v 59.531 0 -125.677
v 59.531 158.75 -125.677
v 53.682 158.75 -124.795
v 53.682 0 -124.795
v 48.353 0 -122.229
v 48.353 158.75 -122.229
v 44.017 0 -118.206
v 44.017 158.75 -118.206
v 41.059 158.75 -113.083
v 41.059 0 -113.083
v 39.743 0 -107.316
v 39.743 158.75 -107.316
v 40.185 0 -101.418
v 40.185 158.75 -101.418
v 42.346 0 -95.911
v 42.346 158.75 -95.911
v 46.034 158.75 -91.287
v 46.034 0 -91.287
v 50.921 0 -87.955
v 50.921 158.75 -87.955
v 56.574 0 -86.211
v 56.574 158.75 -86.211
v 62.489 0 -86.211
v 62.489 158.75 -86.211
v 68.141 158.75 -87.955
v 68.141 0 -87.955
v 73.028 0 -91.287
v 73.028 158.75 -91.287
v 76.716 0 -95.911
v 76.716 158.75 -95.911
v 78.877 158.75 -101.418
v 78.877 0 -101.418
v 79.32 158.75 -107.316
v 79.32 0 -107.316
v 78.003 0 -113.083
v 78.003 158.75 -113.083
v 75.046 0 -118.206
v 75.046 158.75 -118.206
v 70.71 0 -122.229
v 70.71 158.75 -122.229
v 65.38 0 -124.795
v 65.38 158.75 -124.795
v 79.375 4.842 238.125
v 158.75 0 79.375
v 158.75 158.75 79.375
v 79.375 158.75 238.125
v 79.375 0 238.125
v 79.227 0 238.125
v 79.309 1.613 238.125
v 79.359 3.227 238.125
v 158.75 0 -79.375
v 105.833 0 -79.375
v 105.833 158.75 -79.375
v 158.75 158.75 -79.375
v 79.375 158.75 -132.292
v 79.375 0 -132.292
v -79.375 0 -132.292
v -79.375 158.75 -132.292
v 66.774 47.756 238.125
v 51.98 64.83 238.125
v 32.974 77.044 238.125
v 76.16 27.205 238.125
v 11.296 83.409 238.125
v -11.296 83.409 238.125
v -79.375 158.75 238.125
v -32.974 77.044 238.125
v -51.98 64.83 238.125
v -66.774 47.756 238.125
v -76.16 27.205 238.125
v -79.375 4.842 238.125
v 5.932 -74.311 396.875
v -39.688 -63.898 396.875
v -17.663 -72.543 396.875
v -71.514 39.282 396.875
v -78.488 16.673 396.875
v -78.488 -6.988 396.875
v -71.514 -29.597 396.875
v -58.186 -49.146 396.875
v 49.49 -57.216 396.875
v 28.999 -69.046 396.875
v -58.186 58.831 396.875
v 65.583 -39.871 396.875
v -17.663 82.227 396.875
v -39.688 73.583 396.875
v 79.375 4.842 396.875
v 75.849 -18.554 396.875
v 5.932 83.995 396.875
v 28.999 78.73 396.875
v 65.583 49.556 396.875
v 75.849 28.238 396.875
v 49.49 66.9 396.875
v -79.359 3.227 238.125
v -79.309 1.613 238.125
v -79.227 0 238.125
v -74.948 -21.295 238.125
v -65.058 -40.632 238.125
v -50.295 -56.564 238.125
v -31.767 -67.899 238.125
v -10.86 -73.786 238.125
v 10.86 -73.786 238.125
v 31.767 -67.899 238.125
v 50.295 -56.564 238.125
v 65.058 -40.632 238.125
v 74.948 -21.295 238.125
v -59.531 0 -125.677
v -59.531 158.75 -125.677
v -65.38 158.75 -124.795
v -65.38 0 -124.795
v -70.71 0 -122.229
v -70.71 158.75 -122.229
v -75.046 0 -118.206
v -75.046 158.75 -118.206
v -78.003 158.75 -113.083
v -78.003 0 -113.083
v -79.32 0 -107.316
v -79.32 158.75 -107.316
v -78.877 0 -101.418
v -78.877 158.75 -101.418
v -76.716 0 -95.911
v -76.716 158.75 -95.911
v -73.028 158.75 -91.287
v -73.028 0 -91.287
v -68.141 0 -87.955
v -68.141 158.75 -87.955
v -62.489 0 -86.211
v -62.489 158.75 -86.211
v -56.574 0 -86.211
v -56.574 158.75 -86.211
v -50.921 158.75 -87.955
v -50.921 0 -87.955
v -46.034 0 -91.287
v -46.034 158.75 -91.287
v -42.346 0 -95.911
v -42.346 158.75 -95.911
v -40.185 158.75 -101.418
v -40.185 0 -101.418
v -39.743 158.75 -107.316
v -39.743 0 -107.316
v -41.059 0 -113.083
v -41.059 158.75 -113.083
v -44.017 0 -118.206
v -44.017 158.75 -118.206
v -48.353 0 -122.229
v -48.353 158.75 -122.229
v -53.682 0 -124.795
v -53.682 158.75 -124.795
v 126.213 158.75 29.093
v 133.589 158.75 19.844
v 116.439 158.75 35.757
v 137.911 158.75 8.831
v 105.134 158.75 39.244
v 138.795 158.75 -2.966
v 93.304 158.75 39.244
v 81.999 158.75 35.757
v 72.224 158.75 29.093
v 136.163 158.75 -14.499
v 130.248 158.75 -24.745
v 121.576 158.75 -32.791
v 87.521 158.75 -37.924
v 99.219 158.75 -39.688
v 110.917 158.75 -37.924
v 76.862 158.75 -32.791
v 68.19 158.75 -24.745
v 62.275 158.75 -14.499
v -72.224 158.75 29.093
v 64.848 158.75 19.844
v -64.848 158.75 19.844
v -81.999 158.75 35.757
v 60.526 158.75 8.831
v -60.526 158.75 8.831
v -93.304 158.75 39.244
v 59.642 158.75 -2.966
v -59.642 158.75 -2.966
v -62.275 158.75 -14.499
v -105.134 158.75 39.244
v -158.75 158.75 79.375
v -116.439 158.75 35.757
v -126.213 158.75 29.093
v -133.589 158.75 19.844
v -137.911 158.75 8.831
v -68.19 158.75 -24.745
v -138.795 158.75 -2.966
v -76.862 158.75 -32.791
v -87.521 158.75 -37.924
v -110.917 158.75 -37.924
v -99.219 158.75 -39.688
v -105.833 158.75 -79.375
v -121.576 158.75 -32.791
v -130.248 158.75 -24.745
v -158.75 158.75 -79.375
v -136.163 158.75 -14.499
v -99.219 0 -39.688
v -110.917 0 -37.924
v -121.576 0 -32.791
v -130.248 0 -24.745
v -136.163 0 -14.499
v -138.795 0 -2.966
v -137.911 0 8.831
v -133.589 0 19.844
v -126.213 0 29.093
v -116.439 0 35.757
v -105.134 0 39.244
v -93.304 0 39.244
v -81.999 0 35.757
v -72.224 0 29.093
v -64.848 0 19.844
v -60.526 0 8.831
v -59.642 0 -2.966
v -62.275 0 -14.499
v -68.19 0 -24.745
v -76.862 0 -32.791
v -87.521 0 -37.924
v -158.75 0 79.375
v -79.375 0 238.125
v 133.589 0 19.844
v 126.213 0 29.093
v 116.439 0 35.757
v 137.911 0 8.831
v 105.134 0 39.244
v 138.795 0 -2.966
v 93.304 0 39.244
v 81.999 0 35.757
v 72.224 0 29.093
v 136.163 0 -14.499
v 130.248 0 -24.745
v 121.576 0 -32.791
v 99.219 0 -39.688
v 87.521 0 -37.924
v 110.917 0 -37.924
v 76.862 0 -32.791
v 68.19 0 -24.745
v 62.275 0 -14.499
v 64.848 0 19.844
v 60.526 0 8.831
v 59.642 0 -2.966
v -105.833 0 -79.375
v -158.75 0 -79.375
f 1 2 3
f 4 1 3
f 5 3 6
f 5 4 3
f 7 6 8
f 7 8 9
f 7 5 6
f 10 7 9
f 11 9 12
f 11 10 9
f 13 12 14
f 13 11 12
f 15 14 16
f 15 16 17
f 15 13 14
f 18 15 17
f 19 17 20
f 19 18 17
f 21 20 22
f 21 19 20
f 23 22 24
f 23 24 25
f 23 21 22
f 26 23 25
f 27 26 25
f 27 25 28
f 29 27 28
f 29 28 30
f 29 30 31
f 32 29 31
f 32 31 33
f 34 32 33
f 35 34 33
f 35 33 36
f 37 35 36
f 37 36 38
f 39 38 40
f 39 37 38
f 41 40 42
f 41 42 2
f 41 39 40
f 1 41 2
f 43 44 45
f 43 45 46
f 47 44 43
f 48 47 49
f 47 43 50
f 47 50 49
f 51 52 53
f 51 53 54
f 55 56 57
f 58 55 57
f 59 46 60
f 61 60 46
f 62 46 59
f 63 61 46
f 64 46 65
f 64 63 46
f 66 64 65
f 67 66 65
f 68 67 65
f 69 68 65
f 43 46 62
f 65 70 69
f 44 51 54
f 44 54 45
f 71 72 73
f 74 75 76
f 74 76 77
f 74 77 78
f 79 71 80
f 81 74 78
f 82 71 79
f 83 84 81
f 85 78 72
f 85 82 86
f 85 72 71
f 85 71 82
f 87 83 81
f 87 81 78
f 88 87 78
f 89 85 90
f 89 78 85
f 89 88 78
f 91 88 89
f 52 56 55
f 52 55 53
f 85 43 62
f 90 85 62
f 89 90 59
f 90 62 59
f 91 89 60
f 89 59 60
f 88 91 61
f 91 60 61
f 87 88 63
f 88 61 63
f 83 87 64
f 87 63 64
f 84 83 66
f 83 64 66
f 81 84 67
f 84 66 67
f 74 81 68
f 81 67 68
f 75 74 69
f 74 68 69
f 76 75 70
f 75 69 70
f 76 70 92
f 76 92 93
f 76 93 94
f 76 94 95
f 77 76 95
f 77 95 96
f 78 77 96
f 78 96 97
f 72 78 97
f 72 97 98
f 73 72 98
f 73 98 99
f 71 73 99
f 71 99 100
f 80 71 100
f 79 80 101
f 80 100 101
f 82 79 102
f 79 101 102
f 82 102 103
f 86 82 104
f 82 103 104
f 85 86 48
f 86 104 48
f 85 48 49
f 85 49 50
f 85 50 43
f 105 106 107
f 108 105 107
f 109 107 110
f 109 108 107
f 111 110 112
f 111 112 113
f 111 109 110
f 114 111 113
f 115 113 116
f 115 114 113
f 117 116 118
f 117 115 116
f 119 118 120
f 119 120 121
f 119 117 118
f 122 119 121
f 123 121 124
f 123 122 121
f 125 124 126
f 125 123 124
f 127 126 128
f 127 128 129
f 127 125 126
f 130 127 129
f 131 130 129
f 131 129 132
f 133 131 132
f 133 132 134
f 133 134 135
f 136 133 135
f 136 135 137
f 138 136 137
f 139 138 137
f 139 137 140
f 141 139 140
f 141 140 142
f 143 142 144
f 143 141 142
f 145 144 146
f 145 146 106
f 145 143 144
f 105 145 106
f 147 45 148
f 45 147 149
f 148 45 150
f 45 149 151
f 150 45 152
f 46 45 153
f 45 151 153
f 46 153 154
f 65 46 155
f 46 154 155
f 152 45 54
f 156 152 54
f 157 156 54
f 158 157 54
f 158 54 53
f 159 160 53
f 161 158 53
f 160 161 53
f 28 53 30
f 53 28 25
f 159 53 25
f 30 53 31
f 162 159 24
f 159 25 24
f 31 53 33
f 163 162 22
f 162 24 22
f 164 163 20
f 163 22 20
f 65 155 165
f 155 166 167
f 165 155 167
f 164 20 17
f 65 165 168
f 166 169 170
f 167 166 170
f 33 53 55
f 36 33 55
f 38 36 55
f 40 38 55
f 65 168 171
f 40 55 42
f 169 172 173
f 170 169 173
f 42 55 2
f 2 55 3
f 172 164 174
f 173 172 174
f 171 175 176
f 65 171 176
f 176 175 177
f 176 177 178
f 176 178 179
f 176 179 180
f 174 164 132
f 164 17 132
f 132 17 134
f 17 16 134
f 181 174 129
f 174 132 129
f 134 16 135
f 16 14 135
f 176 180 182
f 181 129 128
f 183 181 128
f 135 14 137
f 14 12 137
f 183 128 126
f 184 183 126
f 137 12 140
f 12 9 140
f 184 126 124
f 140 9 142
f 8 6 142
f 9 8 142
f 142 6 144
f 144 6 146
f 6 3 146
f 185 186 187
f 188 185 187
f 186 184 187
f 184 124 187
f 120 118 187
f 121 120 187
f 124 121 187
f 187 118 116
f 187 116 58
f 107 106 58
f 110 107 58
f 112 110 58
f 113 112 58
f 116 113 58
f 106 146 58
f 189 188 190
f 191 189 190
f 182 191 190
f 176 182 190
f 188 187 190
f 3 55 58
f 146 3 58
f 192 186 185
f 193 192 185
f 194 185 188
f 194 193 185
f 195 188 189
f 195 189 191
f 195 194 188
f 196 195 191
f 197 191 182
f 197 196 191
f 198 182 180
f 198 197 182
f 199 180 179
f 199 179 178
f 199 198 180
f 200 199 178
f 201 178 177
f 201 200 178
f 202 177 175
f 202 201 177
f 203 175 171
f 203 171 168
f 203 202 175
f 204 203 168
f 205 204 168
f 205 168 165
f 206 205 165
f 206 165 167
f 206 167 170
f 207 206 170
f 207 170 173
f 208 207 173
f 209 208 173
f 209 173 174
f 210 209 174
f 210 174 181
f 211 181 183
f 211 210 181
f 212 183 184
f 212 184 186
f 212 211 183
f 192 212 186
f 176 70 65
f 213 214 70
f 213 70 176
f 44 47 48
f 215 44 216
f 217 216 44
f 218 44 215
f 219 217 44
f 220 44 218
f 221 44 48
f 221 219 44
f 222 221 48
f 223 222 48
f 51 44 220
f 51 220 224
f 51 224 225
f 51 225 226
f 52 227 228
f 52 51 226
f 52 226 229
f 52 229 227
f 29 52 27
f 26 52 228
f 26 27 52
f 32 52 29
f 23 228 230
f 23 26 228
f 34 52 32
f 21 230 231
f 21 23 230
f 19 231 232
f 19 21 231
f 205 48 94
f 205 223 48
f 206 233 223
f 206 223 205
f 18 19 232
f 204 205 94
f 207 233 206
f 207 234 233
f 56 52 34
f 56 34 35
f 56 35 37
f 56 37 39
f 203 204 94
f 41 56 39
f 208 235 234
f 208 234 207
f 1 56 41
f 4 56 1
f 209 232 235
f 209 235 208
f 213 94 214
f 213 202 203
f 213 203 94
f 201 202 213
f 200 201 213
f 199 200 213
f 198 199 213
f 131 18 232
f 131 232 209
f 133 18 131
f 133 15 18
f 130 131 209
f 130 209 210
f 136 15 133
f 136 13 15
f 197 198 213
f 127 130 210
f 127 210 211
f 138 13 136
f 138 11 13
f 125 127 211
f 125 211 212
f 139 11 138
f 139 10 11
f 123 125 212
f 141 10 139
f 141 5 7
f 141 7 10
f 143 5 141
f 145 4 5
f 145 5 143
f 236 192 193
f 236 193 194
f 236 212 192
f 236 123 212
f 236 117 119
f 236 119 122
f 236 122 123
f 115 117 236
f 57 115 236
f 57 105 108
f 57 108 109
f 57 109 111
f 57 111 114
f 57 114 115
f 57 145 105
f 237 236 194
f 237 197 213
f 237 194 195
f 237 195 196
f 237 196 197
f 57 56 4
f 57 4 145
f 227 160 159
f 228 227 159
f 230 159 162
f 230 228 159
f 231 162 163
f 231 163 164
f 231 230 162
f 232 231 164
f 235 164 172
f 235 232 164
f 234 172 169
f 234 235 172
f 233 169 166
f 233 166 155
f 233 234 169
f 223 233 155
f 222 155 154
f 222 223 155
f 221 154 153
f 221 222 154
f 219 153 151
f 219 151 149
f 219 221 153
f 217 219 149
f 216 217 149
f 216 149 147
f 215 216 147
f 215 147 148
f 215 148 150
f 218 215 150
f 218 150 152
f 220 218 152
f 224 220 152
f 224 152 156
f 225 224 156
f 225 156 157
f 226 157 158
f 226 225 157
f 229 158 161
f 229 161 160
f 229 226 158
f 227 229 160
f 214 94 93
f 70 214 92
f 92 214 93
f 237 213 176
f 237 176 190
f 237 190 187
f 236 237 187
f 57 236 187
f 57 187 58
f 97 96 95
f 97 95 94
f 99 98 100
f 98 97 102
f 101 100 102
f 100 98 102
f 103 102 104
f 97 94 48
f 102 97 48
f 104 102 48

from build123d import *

# Parameters (mm, degrees)
SKETCH1_R           = 39.6875
SKETCH1_R_2         = 19.84375
BOSS_EXTRUDE1_DEPTH = 158.75
SKETCH2_R           = 79.375
BOSS_EXTRUDE2_DEPTH = 158.75


with BuildPart() as part:
    # Sketch1 → Boss-Extrude1 (new body)
    with BuildSketch(Plane(origin=(0, 0, 0), x_dir=(1, 0, 0), z_dir=(0, 1, 0))):
        Polygon((158.75, -79.375), (79.375, -238.125), (-79.375, -238.125), (-158.75, -79.375), (-158.75, 79.375), (-105.833333333, 79.375), (-79.375, 132.291666667), (0, 132.291666667), (79.375, 132.291666667), (105.833333333, 79.375), (158.75, 79.375), align=None)
        with Locations(Location((-99.21875, 0, 0), (0, 0, 90))):
            Circle(SKETCH1_R, mode=Mode.SUBTRACT)
        with Locations(Location((99.21875, 0, 0), (0, 0, 90))):
            Circle(SKETCH1_R, mode=Mode.SUBTRACT)
        with Locations(Location((-59.53125, 105.833333333, 0), (0, 0, 90))):
            Circle(SKETCH1_R_2, mode=Mode.SUBTRACT)
        with Locations(Location((59.53125, 105.833333333, 0), (0, 0, 90))):
            Circle(SKETCH1_R_2, mode=Mode.SUBTRACT)
    extrude(amount=BOSS_EXTRUDE1_DEPTH)

    # Sketch2 → Boss-Extrude2 (add)
    with BuildSketch(Plane.XY.offset(238.125)):
        with Locations((0, 4.842306375)):
            Circle(SKETCH2_R)
    extrude(amount=BOSS_EXTRUDE2_DEPTH)


solid = part.part
